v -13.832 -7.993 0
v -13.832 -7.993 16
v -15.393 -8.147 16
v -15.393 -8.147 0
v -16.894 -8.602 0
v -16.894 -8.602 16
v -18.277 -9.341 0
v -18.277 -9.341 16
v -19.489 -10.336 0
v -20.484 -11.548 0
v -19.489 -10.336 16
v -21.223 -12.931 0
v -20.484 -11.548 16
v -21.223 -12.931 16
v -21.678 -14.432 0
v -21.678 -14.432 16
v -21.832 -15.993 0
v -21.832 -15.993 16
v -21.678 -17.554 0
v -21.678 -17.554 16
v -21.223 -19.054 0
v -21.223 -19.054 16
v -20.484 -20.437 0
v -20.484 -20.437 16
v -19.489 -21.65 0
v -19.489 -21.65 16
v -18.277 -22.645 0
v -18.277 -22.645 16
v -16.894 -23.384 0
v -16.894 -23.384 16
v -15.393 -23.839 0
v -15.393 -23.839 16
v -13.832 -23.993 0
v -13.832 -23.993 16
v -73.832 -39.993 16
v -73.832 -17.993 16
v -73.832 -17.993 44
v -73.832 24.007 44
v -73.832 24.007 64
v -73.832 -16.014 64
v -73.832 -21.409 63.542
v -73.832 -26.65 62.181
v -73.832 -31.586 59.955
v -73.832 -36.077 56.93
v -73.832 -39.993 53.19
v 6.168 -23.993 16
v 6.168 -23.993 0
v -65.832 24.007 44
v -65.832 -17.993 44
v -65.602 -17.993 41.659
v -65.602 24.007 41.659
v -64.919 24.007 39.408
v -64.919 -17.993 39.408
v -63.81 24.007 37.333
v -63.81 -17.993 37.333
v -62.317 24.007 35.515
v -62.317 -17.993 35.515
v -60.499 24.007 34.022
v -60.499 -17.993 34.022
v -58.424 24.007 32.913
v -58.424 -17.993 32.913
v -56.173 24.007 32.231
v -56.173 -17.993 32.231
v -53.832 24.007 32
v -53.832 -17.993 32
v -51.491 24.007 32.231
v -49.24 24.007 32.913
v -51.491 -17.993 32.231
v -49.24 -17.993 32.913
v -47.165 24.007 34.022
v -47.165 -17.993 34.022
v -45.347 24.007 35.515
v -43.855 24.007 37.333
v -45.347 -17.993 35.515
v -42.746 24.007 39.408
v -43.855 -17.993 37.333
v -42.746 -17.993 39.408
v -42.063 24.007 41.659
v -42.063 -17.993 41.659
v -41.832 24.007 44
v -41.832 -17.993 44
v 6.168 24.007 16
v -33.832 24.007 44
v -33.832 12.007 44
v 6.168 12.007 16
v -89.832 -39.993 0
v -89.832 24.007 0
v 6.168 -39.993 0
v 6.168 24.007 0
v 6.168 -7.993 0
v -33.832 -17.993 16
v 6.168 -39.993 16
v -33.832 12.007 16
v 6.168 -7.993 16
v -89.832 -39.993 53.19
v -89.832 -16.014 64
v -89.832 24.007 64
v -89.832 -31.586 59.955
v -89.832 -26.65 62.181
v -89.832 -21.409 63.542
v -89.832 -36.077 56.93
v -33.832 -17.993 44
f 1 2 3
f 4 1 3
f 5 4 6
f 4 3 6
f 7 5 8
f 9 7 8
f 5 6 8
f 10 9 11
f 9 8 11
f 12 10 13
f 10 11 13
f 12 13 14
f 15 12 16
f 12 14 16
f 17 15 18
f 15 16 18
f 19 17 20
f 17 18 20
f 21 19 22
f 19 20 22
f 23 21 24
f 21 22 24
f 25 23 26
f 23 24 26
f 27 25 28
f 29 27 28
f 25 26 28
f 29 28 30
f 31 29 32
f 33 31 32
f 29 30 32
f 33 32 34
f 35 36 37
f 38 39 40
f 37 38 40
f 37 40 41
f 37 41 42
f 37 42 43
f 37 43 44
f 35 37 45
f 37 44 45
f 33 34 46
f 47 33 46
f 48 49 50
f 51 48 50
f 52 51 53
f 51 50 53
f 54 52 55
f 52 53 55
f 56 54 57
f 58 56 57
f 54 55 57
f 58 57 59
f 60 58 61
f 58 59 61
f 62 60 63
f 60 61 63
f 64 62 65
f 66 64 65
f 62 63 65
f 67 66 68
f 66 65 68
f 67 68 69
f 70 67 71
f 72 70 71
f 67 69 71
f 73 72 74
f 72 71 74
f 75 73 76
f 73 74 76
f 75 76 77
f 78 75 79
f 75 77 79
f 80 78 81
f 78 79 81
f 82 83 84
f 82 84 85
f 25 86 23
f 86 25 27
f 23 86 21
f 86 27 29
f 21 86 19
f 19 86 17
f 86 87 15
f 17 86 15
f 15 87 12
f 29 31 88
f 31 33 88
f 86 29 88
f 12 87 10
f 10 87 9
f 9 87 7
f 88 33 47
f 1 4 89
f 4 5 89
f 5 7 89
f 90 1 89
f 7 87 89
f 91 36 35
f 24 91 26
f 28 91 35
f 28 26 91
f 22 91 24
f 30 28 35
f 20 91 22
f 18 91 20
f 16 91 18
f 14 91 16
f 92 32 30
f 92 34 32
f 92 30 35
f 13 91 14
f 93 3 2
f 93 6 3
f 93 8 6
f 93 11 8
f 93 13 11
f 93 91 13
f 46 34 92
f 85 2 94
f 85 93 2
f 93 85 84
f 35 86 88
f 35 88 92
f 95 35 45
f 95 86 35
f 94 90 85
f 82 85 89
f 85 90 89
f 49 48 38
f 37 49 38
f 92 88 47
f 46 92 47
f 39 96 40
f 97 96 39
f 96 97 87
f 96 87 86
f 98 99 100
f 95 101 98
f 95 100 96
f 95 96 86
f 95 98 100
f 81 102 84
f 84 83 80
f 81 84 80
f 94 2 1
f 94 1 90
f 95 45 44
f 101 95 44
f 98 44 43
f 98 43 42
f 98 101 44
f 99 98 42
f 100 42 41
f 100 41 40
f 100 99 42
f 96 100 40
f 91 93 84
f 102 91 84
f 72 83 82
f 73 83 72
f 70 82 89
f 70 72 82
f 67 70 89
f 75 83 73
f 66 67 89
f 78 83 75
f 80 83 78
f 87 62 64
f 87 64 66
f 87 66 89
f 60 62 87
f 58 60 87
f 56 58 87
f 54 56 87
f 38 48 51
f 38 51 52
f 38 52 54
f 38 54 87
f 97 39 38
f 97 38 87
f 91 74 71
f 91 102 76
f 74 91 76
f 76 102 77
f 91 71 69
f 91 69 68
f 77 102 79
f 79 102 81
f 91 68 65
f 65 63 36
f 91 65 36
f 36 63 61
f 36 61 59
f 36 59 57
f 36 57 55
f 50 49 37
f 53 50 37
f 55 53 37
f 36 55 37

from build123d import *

# Parameters (mm, degrees)
F0_W      = 96
F0_H      = 64
F1_DEPTH  = 16
F3_DEPTH  = 16
F4_W      = 40
F4_H      = 28
F5_DEPTH  = 42
F7_DEPTH  = 42
F8_W      = 20
F8_H      = 16
F9_DEPTH  = 16
F11_DEPTH = 12


with BuildPart() as f1:
    # F0 (on Top) → F1 (new body)
    with BuildSketch(Plane.XY):
        with Locations((-41.832156, -7.992789)):
            Rectangle(F0_W, F0_H)
    extrude(amount=F1_DEPTH)

    # F2 (on face) → F3 (join)
    with BuildSketch(Plane(origin=(-89.832156, 0, 0), x_dir=(0, -1, 0), z_dir=(-1, 0, 0))):
        with BuildLine():
            Line((-24.007211, 64), (-24.007211, 16))
            Line((-24.007211, 16), (39.992789, 16))
            Line((39.992789, 16), (39.992789, 53.190336))
            ThreePointArc((39.992789, 53.190336), (29.165485, 61.172682), (16.014263, 64))
            Line((16.014263, 64), (-24.007211, 64))
        make_face()
    extrude(amount=-F3_DEPTH)

    # F4 (on face) → F5 (join)
    with BuildSketch(Plane(origin=(0, 24.007211, 0), x_dir=(-1, 0, 0), z_dir=(0, 1, 0))):
        with Locations((53.832156, 30)):
            Rectangle(F4_W, F4_H)
    extrude(amount=-F5_DEPTH)

    # F6 (on face) → F7 (cut)
    with BuildSketch(Plane.XZ.offset(17.992789)):
        with BuildLine():
            ThreePointArc((-65.832156, 44), (-53.832156, 32), (-41.832156, 44))
            Line((-41.832156, 44), (-65.832156, 44))
        make_face()
    extrude(amount=-F7_DEPTH, mode=Mode.SUBTRACT)

    # F8 (on face) → F9 (cut)
    with BuildSketch(Plane.XY.offset(16)):
        with Locations((-3.832156, -15.992789)):
            Rectangle(F8_W, F8_H)
        with BuildLine():
            ThreePointArc((-13.832156, -7.992789), (-21.832156, -15.992789), (-13.832156, -23.992789))
            Line((-13.832156, -23.992789), (-13.832156, -7.992789))
        make_face()
    extrude(amount=-F9_DEPTH, mode=Mode.SUBTRACT)

    # F10 (on face) → F11 (join)
    with BuildSketch(Plane(origin=(0, 24.007211, 0), x_dir=(-1, 0, 0), z_dir=(0, 1, 0))):
        Polygon((33.832156, 44), (-6.167844, 16), (33.832156, 16), align=None)
    extrude(amount=-F11_DEPTH)


solid = f1.part
